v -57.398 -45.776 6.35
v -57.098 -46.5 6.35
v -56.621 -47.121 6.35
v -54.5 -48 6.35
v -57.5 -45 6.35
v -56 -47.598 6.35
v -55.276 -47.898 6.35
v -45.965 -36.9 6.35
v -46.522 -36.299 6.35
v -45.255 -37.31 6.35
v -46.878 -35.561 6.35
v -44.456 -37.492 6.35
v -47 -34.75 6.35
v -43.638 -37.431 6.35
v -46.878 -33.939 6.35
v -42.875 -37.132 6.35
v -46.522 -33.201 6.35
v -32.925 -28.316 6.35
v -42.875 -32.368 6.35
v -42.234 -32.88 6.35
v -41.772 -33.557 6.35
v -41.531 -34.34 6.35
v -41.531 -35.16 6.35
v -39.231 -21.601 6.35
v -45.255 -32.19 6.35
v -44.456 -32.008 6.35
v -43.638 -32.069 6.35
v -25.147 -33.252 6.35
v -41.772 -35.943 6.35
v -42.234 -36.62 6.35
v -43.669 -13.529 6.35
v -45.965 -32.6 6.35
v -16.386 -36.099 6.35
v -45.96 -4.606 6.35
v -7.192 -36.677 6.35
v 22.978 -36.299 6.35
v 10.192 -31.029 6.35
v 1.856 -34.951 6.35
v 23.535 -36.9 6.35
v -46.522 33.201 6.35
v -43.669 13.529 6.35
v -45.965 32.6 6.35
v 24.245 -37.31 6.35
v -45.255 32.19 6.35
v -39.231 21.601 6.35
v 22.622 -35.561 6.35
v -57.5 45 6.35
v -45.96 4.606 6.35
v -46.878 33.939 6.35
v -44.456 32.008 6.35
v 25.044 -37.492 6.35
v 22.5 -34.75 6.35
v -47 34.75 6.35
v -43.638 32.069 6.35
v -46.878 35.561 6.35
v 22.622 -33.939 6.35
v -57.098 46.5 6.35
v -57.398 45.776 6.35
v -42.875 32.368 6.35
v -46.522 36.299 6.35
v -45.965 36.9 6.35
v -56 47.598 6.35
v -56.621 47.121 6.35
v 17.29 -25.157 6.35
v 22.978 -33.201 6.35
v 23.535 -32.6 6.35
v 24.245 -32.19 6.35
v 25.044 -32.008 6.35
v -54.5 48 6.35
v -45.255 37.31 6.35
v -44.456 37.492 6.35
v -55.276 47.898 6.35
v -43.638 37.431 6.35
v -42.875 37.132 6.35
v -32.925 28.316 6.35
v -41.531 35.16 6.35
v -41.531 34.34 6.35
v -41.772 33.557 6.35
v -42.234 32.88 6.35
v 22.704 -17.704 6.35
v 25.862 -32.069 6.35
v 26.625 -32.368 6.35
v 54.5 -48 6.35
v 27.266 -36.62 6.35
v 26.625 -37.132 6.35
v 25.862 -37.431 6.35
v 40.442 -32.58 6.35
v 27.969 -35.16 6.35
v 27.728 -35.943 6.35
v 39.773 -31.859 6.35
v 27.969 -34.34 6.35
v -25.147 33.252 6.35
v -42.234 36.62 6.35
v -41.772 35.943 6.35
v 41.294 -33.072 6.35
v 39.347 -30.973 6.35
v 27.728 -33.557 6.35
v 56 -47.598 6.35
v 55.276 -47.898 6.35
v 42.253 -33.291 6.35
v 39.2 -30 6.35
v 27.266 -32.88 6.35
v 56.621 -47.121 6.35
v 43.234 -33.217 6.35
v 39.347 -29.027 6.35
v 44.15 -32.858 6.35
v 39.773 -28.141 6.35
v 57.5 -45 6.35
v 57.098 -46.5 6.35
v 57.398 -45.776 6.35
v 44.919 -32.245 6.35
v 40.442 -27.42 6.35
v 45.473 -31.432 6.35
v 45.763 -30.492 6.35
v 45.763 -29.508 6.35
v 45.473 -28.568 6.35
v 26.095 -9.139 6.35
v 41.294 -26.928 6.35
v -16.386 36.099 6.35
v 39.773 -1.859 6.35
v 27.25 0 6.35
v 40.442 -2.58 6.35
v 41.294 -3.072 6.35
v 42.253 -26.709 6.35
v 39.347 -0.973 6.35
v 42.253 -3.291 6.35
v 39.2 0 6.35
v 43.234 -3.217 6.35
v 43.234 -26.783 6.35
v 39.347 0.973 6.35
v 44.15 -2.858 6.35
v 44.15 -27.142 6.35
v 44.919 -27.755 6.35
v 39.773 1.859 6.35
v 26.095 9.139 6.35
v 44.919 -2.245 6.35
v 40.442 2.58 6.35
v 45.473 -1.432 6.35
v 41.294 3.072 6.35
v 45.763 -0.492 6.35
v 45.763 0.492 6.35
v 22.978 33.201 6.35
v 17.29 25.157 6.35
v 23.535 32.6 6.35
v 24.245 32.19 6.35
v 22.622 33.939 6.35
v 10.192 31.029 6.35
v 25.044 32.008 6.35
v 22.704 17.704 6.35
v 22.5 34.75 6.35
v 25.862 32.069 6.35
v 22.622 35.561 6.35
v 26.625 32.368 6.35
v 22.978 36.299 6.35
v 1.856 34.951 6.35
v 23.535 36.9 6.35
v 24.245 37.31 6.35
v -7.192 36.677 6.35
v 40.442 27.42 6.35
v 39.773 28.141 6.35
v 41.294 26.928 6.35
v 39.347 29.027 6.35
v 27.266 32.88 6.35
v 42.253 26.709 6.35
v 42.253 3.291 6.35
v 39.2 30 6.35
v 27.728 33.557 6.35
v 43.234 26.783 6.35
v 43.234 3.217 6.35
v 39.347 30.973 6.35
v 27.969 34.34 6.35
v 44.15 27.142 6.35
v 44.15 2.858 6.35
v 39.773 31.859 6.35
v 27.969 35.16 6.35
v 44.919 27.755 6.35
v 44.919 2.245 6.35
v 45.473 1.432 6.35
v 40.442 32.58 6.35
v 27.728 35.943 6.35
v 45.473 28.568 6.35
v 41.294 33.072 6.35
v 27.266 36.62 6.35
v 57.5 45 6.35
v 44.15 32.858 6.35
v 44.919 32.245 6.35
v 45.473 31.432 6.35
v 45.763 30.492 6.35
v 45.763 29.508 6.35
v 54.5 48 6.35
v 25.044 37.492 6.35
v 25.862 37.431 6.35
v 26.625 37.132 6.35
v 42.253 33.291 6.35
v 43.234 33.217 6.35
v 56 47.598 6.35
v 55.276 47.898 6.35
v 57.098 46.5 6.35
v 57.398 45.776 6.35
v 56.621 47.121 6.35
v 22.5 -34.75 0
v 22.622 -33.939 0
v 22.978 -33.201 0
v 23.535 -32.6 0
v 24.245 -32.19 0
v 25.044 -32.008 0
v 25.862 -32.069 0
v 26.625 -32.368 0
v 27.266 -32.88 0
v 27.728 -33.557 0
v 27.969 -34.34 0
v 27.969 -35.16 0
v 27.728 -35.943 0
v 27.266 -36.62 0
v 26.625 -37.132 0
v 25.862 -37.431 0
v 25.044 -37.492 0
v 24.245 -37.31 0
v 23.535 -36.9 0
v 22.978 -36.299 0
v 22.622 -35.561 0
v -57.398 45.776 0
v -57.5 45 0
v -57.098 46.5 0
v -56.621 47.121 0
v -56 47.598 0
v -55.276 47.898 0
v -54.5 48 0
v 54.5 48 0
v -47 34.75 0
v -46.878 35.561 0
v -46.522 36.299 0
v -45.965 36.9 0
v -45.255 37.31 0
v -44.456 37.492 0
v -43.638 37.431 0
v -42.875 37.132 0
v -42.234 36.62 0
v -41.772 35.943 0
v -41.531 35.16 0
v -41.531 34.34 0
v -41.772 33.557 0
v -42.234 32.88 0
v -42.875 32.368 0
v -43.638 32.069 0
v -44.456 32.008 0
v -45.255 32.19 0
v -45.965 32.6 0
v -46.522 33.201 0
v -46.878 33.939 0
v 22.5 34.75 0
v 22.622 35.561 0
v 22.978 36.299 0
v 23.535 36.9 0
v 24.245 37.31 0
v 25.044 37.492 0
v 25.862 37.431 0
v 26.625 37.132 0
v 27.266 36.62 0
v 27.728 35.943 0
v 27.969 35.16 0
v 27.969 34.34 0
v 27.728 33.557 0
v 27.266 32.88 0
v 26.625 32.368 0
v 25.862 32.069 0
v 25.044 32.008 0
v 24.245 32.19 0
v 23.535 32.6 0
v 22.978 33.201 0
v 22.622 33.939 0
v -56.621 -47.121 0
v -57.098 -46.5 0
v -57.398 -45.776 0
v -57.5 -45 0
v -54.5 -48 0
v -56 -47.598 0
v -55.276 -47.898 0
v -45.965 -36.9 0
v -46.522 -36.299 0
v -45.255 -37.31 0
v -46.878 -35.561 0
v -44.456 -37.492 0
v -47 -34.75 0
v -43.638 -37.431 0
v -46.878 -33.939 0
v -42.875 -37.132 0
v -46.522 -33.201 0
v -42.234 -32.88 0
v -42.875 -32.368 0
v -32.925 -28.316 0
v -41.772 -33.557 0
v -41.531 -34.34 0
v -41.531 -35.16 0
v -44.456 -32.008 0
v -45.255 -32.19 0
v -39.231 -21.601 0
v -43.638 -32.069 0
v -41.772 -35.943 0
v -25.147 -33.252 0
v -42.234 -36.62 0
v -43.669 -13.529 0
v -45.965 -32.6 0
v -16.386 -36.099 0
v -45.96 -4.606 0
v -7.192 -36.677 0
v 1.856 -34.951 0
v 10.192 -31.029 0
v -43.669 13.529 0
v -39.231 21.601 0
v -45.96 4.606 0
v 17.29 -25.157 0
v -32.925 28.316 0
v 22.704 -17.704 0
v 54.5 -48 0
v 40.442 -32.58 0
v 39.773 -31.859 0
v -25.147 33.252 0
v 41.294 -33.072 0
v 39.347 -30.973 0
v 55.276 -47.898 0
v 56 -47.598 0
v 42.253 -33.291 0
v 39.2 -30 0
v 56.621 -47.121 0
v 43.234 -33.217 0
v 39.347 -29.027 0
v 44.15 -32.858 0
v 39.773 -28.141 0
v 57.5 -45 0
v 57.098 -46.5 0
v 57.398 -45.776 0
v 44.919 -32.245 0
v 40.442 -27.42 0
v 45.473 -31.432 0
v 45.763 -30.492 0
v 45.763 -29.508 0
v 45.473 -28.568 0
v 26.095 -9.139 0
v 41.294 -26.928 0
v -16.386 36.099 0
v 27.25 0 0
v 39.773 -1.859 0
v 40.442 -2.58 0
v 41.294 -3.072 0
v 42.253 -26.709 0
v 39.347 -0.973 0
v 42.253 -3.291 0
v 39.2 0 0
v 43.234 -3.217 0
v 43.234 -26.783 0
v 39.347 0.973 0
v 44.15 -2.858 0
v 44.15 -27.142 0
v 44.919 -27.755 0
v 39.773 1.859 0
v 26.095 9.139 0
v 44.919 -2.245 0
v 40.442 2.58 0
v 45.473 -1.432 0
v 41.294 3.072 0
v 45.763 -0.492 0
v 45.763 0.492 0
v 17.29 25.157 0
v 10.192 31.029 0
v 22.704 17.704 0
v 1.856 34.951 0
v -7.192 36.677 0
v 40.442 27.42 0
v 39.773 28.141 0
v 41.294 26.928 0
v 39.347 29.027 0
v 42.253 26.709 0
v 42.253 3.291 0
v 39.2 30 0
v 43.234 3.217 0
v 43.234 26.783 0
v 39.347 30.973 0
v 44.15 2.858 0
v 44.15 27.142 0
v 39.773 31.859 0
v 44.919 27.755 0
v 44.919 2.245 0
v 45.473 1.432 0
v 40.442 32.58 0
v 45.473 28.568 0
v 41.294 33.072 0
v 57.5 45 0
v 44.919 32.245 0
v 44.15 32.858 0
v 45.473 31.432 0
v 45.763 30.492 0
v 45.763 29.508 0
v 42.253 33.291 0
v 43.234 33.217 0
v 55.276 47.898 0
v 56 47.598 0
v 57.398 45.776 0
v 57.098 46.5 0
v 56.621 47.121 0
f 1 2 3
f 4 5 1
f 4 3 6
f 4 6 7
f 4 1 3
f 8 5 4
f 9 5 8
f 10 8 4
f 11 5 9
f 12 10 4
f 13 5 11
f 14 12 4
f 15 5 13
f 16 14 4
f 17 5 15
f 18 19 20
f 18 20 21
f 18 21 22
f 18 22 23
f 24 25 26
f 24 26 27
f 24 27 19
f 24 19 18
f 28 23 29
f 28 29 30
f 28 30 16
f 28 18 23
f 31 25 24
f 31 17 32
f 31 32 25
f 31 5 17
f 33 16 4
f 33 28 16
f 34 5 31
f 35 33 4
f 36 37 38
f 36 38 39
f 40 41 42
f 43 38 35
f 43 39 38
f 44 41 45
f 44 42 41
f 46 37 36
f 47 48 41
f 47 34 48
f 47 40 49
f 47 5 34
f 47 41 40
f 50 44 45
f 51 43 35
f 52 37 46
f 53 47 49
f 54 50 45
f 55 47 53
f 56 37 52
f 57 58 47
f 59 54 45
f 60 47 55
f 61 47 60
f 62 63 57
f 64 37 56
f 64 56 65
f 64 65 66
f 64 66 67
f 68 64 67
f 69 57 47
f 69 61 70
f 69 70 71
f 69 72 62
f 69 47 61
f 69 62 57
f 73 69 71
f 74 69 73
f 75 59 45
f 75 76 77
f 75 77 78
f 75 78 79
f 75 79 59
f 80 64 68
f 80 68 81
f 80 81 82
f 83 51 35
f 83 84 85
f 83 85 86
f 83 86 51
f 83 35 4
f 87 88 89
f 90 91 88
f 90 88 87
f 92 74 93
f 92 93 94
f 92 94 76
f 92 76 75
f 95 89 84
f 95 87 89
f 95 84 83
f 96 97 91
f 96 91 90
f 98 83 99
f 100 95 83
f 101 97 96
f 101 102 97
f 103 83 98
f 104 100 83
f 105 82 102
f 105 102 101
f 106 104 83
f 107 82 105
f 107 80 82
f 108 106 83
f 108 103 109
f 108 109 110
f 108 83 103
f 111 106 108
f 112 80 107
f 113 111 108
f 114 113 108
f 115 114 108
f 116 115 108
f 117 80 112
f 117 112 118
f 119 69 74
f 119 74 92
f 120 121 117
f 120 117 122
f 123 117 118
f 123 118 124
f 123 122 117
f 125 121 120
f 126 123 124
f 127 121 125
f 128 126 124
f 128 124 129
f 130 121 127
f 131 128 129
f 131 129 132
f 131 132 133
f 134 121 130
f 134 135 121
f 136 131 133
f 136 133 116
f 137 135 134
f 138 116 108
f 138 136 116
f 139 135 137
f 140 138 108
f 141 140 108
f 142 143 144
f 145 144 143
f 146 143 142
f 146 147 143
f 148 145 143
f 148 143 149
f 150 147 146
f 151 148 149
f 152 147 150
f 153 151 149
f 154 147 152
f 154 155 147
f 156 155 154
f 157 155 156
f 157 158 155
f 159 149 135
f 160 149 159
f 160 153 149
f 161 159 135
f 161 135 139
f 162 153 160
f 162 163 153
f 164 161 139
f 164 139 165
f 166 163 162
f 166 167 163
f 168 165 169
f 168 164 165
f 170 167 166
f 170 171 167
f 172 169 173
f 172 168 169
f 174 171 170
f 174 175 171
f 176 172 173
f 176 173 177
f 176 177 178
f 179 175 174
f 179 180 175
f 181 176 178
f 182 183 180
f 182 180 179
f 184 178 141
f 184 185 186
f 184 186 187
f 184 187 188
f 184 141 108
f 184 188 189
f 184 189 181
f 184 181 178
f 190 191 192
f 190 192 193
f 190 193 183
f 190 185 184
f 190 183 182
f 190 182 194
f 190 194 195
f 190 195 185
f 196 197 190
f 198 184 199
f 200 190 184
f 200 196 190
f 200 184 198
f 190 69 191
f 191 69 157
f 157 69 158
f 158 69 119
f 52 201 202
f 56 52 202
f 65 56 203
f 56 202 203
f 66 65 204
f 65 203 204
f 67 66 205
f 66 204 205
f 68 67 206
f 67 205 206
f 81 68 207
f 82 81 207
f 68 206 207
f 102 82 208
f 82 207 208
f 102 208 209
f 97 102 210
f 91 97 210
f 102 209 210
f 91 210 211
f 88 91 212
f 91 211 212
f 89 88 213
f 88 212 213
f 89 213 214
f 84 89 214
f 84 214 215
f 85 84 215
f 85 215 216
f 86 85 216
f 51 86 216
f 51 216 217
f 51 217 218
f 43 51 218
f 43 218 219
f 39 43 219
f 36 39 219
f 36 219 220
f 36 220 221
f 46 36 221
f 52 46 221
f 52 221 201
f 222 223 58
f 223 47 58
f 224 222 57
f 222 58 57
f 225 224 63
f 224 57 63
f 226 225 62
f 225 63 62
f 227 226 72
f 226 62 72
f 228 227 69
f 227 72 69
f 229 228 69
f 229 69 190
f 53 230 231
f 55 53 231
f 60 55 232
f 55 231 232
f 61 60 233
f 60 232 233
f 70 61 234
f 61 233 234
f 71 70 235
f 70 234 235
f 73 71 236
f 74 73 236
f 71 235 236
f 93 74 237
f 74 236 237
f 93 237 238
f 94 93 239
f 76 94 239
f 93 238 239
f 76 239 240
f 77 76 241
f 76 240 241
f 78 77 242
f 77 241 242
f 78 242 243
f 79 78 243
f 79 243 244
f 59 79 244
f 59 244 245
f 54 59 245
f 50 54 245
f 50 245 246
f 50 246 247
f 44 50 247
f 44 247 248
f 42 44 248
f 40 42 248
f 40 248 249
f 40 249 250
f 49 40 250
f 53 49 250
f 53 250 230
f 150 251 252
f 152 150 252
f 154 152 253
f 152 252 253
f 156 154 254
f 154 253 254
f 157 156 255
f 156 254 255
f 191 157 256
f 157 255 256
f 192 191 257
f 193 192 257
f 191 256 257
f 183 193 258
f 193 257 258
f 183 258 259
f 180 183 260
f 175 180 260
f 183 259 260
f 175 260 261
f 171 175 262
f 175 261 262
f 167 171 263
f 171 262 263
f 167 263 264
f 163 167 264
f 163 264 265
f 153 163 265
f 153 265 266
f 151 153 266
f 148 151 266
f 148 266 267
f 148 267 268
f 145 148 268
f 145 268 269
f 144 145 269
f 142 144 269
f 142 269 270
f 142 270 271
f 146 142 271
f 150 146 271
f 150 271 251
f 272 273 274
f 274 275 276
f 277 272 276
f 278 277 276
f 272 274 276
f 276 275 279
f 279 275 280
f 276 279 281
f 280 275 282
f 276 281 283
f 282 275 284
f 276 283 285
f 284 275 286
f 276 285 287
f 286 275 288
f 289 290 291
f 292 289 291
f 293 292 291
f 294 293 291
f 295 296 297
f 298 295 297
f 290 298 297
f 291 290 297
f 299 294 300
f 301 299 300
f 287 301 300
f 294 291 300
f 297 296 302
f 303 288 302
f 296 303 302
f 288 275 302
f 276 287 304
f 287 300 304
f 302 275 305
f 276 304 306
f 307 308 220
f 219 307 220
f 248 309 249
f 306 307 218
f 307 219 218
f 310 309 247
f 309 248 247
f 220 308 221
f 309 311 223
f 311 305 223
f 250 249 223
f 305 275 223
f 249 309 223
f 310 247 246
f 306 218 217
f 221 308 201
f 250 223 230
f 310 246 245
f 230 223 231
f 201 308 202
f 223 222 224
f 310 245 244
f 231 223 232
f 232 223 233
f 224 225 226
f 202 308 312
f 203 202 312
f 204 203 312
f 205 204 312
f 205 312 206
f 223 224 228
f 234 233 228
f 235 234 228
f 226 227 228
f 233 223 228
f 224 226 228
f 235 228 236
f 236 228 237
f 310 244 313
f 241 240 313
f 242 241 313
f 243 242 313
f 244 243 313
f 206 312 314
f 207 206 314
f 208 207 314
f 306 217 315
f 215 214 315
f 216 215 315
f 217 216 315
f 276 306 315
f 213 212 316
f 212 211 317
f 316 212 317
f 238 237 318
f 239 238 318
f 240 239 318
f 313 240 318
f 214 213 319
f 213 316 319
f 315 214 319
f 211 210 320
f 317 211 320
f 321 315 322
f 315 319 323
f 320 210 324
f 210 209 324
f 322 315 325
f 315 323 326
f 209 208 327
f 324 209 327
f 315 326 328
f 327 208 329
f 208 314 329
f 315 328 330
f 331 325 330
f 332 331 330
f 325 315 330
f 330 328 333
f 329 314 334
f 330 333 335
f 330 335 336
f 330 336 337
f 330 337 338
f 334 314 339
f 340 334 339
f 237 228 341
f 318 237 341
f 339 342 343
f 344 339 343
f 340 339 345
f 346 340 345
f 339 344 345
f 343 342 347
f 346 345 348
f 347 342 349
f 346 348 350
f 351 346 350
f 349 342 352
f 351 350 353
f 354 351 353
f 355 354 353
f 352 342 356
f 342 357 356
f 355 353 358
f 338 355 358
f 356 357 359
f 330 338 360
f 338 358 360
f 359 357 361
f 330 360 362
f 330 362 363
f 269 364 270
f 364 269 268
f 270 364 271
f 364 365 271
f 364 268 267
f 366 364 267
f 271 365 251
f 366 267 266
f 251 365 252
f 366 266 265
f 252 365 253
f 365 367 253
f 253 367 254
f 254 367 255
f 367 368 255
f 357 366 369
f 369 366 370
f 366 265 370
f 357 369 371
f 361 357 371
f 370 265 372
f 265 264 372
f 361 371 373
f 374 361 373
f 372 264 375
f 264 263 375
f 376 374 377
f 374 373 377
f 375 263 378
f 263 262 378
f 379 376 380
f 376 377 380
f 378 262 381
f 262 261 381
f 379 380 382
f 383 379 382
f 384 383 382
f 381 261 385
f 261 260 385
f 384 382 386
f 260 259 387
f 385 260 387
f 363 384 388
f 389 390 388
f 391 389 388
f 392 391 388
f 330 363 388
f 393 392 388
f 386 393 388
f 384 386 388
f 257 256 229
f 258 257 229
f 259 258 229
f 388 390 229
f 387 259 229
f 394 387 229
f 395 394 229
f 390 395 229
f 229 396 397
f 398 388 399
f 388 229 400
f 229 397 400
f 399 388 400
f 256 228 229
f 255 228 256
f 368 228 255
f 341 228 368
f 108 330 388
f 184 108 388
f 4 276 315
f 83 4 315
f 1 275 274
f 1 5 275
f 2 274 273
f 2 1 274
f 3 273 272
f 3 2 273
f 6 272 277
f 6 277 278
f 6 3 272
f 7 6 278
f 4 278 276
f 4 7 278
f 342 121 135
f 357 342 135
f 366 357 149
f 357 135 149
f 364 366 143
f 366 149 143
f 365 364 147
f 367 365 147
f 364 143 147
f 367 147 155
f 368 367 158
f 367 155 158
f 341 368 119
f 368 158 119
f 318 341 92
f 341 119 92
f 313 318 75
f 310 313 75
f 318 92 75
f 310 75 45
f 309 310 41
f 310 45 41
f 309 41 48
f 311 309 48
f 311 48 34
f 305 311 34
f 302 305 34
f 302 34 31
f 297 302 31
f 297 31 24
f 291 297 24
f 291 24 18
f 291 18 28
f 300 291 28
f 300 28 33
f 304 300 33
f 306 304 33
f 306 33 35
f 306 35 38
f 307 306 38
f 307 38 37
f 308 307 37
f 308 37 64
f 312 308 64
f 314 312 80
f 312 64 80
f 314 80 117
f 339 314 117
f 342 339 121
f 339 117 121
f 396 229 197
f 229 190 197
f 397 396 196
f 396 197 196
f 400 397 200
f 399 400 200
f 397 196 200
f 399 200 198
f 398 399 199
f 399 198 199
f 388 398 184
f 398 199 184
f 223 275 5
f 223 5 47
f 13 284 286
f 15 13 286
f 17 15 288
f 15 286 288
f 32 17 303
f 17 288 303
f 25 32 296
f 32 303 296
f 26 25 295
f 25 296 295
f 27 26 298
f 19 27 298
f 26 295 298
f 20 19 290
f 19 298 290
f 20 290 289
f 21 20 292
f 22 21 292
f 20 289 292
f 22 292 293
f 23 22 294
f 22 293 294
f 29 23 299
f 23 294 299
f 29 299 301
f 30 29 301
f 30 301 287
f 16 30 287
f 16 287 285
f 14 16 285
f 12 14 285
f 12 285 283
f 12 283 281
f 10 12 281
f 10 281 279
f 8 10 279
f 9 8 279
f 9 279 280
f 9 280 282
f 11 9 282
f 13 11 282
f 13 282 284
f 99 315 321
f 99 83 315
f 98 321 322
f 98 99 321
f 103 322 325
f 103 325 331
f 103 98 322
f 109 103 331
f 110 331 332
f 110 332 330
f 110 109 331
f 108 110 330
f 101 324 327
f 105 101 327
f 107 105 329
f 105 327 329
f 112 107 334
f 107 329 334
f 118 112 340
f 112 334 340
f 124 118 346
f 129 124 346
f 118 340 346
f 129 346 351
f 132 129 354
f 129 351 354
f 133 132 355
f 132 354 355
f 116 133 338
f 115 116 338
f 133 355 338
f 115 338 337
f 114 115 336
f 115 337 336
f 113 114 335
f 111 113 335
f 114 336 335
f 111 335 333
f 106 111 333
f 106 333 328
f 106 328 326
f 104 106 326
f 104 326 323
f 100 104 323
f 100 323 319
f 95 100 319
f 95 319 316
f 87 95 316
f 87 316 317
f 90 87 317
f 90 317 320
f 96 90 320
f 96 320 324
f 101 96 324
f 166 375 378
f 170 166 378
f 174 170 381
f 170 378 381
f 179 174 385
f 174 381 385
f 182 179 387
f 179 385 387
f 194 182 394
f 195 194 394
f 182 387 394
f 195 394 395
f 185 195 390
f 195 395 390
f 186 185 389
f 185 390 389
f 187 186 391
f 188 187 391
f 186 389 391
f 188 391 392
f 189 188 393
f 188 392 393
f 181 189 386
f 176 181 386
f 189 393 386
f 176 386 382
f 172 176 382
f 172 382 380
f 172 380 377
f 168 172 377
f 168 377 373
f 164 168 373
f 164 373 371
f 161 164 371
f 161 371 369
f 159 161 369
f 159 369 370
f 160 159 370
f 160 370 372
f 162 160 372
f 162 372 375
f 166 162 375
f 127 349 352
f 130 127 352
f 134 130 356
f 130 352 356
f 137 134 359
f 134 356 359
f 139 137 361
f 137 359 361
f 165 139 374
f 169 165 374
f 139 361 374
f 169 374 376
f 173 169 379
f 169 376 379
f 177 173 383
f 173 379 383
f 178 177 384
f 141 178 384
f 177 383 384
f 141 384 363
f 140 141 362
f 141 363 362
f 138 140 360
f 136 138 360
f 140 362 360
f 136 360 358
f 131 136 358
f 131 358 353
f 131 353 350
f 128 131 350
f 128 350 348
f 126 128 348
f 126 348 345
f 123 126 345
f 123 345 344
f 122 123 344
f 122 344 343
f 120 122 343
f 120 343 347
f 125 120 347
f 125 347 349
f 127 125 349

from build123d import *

# Parameters (mm, degrees)
SKETCH1_W                = 115
SKETCH1_H                = 96
BOSS_EXTRUDE1_DEPTH      = 6.35
SKETCH2_R                = 36.75
CUT_EXTRUDE1_DEPTH       = 7.35
FILLET1_R                = 3
M6_CLEARANCE_HOLE1_D     = 6.6
M6_CLEARANCE_HOLE1_DEPTH = 20
M6_CLEARANCE_HOLE1_TIP   = 1.982840043
M5_CLEARANCE_HOLE1_D     = 5.5


with BuildPart() as part:
    # Sketch1 → Boss-Extrude1 (new body)
    with BuildSketch(Plane.XY):
        Rectangle(SKETCH1_W, SKETCH1_H)
    extrude(amount=BOSS_EXTRUDE1_DEPTH)

    # Sketch2 → Cut-Extrude1 (cut, through all)
    with BuildSketch(Plane.XY.offset(6.35)):
        with Locations((-9.5, 0)):
            Circle(SKETCH2_R)
    extrude(amount=-CUT_EXTRUDE1_DEPTH, mode=Mode.SUBTRACT)

    # Fillet1
    fillet1_edges = [part.edges().sort_by_distance(p)[0] for p in [
        (57.5, -48, 3.175),
        (-57.5, -48, 3.175),
        (-57.5, 48, 3.175),
        (57.5, 48, 3.175),
    ]]
    fillet(fillet1_edges, radius=FILLET1_R)

    # M6 Clearance Hole1
    with Locations(Plane.XY.offset(6.35)):
        with Locations((42.5, 30), (42.5, 0), (42.5, -30)):
            Hole(M6_CLEARANCE_HOLE1_D / 2, depth=M6_CLEARANCE_HOLE1_DEPTH)
            with Locations((0, 0, -(M6_CLEARANCE_HOLE1_DEPTH + M6_CLEARANCE_HOLE1_TIP / 2))):  # 118° drill point
                Cone(0, M6_CLEARANCE_HOLE1_D / 2, M6_CLEARANCE_HOLE1_TIP, mode=Mode.SUBTRACT)

    # M5 Clearance Hole1 (through all)
    with Locations(Plane.XY.offset(6.35)):
        with Locations((25.25, -34.75), (-44.25, -34.75), (-44.25, 34.75), (25.25, 34.75)):
            Hole(M5_CLEARANCE_HOLE1_D / 2)


solid = part.part
